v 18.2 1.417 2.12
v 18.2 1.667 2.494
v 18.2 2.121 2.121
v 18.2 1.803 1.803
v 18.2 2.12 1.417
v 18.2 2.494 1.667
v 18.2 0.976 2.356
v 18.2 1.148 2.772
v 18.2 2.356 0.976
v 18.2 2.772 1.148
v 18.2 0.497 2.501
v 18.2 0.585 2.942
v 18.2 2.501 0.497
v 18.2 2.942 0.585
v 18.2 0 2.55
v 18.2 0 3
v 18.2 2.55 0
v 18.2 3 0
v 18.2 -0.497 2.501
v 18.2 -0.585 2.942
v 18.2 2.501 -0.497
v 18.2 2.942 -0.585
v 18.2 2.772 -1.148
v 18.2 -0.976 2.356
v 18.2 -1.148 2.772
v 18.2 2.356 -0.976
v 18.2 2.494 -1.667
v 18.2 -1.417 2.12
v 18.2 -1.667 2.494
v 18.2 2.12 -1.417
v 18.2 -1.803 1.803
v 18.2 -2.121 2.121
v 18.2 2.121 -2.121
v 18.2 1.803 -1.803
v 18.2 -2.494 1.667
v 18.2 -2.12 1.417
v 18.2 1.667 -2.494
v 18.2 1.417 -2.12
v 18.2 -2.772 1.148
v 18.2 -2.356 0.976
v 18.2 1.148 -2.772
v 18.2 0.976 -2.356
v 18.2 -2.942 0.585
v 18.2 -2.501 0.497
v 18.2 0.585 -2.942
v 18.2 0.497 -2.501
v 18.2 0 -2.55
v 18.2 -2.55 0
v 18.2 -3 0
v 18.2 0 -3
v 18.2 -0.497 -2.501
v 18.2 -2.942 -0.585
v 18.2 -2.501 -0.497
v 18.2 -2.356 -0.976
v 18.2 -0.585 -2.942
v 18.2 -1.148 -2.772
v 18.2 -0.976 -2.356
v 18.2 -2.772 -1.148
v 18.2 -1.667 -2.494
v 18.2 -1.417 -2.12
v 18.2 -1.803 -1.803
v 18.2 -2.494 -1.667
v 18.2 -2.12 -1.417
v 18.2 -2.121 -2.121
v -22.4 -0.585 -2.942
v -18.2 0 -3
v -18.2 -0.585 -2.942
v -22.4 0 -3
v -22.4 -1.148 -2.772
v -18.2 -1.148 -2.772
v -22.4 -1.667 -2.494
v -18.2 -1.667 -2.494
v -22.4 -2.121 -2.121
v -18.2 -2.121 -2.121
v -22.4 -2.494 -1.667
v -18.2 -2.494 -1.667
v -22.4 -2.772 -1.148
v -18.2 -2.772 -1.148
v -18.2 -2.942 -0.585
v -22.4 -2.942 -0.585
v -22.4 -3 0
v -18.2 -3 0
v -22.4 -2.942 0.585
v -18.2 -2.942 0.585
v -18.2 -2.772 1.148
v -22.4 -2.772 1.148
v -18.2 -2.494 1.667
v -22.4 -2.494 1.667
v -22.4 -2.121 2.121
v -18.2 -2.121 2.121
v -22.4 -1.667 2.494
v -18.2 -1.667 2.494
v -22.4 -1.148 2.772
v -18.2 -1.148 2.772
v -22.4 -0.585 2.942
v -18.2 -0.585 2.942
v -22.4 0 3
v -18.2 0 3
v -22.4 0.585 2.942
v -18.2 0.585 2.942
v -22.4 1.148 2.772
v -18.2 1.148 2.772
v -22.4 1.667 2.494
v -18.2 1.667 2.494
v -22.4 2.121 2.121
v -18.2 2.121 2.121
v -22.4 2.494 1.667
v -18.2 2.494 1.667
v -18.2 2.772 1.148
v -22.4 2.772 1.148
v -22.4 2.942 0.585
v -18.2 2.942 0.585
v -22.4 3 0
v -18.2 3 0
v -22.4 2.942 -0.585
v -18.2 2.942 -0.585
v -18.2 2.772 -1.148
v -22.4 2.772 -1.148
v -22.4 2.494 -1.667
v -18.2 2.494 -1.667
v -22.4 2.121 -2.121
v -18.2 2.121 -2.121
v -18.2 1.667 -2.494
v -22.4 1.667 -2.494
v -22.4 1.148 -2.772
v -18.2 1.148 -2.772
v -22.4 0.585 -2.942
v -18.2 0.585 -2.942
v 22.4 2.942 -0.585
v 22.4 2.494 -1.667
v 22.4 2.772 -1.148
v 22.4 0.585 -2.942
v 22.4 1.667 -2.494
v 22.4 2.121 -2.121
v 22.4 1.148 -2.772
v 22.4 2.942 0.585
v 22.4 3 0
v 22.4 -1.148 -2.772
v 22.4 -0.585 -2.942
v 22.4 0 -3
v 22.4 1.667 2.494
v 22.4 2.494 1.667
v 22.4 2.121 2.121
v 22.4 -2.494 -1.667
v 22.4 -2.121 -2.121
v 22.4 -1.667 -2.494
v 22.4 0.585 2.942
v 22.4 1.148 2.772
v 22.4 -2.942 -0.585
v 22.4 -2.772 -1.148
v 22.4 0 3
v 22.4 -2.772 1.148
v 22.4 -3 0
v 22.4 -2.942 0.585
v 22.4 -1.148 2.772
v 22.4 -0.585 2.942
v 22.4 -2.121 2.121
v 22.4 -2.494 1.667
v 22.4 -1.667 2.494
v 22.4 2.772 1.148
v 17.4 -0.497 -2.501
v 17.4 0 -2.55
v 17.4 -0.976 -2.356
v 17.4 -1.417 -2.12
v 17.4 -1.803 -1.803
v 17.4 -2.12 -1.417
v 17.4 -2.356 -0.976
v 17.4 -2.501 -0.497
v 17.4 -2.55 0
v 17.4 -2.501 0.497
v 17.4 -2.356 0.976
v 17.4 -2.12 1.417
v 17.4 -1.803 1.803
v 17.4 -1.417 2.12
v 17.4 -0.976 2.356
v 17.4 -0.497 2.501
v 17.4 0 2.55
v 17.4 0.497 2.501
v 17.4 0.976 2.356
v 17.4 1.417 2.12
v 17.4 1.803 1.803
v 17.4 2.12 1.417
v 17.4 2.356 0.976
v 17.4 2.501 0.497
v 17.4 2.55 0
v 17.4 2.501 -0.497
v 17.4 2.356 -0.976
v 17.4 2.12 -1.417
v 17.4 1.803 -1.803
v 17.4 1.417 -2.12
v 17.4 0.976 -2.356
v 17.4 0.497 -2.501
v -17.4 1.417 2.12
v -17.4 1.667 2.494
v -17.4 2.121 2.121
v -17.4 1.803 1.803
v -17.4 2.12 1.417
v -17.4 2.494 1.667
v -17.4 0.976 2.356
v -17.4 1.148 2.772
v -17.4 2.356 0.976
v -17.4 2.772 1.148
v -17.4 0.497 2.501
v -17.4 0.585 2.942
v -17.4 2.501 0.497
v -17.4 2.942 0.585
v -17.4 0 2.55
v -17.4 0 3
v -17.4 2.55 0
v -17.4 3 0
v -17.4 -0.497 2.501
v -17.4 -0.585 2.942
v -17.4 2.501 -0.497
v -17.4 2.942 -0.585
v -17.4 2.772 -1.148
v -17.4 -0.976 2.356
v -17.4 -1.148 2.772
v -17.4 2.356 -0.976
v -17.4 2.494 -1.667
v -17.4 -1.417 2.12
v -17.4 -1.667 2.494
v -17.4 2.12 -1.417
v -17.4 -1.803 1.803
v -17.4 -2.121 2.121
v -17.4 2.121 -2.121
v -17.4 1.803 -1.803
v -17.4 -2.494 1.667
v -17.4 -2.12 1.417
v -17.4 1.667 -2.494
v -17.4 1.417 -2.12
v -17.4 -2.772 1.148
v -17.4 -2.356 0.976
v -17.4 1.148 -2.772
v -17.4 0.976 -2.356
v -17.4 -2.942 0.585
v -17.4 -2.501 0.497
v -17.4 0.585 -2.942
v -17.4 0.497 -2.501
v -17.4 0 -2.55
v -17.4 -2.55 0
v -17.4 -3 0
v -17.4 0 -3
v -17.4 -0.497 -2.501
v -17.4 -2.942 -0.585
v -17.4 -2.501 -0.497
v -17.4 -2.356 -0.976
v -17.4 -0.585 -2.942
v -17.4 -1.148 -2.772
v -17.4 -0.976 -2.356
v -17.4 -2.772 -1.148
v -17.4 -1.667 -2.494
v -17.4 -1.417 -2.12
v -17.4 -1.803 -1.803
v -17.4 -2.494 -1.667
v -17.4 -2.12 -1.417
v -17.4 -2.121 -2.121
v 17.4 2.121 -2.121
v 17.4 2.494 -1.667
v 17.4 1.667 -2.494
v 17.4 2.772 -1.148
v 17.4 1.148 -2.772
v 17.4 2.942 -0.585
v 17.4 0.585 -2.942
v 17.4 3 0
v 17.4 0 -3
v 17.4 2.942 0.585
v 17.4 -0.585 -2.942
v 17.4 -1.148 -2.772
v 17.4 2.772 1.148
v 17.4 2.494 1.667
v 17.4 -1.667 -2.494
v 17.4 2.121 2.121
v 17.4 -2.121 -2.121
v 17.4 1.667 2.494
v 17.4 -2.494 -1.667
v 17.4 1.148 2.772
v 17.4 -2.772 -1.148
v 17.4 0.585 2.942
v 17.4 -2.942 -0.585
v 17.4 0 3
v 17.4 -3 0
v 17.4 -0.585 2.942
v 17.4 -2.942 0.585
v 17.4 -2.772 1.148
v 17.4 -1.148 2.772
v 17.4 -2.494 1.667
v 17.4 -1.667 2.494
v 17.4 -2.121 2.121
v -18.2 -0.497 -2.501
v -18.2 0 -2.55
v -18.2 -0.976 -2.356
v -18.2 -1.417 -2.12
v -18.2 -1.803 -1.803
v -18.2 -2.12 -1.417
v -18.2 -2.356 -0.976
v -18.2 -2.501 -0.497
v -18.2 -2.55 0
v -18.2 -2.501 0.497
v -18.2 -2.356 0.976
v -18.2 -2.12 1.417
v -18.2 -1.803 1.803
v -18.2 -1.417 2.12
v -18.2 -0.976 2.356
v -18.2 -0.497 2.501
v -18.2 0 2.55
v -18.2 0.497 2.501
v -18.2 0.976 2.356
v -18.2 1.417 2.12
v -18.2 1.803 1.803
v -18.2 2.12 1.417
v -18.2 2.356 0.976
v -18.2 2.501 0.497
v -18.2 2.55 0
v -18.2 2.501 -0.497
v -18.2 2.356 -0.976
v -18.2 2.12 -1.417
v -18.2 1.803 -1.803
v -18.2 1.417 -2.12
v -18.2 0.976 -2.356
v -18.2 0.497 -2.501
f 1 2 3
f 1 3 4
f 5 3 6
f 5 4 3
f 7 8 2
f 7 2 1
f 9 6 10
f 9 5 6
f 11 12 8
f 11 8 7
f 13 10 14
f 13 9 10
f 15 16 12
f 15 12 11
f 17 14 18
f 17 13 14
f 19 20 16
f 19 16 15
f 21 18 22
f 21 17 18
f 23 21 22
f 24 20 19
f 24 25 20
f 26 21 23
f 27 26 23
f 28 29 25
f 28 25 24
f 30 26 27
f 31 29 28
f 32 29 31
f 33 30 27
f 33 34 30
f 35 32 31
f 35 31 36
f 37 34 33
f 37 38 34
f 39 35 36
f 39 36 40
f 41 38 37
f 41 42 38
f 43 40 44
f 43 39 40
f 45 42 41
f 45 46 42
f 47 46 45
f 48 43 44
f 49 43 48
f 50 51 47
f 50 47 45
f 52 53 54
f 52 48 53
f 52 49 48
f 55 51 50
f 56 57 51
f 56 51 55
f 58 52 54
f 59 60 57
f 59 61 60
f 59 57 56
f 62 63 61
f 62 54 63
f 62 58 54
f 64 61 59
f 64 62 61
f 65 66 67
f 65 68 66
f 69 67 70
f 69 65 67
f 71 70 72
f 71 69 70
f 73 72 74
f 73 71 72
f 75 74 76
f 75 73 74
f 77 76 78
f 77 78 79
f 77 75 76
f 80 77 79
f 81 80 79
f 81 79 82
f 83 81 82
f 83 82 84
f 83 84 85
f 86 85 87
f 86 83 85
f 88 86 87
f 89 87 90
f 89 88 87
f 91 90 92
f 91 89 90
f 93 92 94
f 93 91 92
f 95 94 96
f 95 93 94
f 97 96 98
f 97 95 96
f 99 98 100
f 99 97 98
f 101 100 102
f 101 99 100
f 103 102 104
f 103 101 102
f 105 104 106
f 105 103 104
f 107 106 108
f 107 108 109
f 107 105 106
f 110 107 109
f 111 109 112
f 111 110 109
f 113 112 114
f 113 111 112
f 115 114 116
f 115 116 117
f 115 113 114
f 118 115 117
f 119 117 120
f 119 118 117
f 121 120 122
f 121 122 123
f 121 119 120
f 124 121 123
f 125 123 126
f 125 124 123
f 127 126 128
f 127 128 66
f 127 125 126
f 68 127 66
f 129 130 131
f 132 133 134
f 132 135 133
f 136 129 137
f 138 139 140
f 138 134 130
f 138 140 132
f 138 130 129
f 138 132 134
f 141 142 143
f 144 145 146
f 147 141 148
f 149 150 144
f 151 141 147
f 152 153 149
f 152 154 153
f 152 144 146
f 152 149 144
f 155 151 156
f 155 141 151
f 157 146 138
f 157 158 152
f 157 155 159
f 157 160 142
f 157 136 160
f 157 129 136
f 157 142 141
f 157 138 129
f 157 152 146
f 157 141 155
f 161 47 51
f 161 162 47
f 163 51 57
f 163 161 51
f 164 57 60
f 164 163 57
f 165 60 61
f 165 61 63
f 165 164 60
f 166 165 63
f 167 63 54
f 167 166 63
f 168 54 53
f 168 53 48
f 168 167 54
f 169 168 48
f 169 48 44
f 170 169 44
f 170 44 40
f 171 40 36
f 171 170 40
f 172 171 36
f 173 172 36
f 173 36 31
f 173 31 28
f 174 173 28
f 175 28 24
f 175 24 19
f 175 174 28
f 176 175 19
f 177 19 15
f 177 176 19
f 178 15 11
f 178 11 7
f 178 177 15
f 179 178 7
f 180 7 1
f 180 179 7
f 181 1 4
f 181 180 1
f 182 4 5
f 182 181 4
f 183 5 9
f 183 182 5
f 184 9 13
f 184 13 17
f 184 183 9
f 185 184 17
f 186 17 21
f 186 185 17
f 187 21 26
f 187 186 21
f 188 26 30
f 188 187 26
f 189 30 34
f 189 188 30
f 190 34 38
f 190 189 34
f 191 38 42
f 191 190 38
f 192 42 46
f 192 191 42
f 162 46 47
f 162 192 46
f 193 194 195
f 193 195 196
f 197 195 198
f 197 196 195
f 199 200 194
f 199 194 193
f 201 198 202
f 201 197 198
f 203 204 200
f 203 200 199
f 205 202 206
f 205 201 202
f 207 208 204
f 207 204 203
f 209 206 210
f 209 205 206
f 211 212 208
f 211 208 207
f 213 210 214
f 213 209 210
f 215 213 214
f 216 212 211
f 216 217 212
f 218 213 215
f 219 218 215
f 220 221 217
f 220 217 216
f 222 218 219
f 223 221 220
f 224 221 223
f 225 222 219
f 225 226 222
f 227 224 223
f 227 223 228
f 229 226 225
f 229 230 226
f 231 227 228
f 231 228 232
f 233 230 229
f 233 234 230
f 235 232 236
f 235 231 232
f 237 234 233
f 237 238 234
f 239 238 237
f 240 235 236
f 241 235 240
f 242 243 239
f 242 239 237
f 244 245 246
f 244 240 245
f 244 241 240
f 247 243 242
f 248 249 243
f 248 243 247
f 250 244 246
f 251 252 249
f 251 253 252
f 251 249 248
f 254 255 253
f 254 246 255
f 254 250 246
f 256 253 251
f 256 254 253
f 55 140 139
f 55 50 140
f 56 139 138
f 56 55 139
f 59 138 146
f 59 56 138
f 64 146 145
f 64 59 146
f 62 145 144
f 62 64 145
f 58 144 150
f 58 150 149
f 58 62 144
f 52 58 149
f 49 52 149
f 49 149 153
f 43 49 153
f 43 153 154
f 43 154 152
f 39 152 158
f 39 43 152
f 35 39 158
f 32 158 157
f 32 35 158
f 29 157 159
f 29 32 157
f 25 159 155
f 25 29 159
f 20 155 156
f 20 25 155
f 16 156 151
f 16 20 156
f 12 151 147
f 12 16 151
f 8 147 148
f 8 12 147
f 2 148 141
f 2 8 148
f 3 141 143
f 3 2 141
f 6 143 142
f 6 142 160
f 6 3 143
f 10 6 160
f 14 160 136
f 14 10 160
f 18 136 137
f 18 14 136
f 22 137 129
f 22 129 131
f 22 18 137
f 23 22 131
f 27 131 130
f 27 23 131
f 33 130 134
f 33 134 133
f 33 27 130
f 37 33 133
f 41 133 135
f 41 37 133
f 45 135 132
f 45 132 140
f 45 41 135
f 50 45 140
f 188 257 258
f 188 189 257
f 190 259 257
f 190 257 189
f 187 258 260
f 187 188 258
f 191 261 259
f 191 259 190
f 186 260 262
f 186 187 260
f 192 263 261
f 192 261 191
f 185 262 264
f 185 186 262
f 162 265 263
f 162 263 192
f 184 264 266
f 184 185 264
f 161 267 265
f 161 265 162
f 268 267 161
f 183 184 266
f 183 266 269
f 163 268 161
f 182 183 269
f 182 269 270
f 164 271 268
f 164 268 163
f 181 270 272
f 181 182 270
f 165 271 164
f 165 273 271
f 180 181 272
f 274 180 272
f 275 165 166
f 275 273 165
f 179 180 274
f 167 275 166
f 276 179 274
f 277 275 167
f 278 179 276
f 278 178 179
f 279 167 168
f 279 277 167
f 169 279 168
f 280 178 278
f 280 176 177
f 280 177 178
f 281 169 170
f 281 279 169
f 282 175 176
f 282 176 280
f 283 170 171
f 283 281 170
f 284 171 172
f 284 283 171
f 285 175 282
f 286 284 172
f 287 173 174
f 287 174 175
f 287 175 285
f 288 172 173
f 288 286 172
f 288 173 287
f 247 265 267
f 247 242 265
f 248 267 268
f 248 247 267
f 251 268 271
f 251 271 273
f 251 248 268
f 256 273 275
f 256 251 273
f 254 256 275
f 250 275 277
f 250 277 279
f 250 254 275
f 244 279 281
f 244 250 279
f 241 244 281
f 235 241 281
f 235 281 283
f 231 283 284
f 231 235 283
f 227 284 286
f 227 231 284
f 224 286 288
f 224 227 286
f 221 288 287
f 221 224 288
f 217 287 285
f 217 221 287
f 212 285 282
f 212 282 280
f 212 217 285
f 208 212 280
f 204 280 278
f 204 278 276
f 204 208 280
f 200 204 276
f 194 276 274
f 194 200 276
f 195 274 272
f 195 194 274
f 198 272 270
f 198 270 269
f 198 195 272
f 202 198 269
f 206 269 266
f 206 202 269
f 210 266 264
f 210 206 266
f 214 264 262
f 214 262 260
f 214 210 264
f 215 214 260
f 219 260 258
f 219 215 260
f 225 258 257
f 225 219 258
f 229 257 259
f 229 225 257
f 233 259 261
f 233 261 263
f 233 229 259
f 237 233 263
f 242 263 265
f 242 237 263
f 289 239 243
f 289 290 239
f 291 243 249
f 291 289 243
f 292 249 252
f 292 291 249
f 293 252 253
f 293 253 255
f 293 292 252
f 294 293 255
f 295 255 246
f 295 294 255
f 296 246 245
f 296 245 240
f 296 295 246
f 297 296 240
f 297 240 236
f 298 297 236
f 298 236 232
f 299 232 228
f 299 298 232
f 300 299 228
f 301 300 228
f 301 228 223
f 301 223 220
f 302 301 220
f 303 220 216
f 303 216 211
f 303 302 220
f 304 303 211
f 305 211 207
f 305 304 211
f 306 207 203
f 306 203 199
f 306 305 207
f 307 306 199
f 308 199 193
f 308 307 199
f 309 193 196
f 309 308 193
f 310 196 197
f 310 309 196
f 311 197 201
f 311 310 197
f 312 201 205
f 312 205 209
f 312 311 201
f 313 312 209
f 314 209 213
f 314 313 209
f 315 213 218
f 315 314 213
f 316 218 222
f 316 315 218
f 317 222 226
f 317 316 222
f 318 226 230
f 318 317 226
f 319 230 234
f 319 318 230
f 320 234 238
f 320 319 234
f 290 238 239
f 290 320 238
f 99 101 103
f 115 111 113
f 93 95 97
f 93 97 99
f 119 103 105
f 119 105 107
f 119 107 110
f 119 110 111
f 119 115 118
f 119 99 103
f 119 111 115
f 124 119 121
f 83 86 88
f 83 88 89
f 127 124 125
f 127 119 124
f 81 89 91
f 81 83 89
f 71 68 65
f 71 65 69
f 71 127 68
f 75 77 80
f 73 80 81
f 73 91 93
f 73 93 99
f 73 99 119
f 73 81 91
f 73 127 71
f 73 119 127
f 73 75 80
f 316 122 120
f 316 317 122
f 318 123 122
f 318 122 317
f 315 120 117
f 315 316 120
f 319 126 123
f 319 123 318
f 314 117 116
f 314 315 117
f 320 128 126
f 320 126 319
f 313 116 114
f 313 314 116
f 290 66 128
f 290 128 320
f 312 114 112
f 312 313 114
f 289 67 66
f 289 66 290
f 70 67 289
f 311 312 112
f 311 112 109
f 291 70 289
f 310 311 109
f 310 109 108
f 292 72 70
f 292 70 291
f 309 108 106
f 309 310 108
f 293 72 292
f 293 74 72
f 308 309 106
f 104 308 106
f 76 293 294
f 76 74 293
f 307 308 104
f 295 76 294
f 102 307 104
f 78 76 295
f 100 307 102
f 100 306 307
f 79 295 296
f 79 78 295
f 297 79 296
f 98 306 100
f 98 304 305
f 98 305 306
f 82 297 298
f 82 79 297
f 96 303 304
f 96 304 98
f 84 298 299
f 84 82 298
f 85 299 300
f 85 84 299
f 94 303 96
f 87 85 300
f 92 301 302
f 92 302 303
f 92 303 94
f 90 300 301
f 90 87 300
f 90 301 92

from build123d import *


with BuildPart() as part:
    # Croquis1 → Revolución1 (revolve)
    with BuildSketch(Plane(origin=(0, 0, 0), x_dir=(-1, 0, 0), z_dir=(0, 1, 0)), mode=Mode.PRIVATE) as revoluci_n1_sk:
        Polygon((-17.4, 3), (17.4, 3), (17.4, 2.55), (18.2, 2.55), (18.2, 3), (22.4, 3), (22.4, 0), (-22.4, 0), (-22.4, 3), (-18.2, 3), (-18.2, 2.55), (-17.4, 2.55), align=None)
    revolve(revoluci_n1_sk.sketch.rotate(Axis((22.4, 0, 0), (-1, 0, 0)), 180), axis=Axis((22.4, 0, 0), (-1, 0, 0)))


solid = part.part
